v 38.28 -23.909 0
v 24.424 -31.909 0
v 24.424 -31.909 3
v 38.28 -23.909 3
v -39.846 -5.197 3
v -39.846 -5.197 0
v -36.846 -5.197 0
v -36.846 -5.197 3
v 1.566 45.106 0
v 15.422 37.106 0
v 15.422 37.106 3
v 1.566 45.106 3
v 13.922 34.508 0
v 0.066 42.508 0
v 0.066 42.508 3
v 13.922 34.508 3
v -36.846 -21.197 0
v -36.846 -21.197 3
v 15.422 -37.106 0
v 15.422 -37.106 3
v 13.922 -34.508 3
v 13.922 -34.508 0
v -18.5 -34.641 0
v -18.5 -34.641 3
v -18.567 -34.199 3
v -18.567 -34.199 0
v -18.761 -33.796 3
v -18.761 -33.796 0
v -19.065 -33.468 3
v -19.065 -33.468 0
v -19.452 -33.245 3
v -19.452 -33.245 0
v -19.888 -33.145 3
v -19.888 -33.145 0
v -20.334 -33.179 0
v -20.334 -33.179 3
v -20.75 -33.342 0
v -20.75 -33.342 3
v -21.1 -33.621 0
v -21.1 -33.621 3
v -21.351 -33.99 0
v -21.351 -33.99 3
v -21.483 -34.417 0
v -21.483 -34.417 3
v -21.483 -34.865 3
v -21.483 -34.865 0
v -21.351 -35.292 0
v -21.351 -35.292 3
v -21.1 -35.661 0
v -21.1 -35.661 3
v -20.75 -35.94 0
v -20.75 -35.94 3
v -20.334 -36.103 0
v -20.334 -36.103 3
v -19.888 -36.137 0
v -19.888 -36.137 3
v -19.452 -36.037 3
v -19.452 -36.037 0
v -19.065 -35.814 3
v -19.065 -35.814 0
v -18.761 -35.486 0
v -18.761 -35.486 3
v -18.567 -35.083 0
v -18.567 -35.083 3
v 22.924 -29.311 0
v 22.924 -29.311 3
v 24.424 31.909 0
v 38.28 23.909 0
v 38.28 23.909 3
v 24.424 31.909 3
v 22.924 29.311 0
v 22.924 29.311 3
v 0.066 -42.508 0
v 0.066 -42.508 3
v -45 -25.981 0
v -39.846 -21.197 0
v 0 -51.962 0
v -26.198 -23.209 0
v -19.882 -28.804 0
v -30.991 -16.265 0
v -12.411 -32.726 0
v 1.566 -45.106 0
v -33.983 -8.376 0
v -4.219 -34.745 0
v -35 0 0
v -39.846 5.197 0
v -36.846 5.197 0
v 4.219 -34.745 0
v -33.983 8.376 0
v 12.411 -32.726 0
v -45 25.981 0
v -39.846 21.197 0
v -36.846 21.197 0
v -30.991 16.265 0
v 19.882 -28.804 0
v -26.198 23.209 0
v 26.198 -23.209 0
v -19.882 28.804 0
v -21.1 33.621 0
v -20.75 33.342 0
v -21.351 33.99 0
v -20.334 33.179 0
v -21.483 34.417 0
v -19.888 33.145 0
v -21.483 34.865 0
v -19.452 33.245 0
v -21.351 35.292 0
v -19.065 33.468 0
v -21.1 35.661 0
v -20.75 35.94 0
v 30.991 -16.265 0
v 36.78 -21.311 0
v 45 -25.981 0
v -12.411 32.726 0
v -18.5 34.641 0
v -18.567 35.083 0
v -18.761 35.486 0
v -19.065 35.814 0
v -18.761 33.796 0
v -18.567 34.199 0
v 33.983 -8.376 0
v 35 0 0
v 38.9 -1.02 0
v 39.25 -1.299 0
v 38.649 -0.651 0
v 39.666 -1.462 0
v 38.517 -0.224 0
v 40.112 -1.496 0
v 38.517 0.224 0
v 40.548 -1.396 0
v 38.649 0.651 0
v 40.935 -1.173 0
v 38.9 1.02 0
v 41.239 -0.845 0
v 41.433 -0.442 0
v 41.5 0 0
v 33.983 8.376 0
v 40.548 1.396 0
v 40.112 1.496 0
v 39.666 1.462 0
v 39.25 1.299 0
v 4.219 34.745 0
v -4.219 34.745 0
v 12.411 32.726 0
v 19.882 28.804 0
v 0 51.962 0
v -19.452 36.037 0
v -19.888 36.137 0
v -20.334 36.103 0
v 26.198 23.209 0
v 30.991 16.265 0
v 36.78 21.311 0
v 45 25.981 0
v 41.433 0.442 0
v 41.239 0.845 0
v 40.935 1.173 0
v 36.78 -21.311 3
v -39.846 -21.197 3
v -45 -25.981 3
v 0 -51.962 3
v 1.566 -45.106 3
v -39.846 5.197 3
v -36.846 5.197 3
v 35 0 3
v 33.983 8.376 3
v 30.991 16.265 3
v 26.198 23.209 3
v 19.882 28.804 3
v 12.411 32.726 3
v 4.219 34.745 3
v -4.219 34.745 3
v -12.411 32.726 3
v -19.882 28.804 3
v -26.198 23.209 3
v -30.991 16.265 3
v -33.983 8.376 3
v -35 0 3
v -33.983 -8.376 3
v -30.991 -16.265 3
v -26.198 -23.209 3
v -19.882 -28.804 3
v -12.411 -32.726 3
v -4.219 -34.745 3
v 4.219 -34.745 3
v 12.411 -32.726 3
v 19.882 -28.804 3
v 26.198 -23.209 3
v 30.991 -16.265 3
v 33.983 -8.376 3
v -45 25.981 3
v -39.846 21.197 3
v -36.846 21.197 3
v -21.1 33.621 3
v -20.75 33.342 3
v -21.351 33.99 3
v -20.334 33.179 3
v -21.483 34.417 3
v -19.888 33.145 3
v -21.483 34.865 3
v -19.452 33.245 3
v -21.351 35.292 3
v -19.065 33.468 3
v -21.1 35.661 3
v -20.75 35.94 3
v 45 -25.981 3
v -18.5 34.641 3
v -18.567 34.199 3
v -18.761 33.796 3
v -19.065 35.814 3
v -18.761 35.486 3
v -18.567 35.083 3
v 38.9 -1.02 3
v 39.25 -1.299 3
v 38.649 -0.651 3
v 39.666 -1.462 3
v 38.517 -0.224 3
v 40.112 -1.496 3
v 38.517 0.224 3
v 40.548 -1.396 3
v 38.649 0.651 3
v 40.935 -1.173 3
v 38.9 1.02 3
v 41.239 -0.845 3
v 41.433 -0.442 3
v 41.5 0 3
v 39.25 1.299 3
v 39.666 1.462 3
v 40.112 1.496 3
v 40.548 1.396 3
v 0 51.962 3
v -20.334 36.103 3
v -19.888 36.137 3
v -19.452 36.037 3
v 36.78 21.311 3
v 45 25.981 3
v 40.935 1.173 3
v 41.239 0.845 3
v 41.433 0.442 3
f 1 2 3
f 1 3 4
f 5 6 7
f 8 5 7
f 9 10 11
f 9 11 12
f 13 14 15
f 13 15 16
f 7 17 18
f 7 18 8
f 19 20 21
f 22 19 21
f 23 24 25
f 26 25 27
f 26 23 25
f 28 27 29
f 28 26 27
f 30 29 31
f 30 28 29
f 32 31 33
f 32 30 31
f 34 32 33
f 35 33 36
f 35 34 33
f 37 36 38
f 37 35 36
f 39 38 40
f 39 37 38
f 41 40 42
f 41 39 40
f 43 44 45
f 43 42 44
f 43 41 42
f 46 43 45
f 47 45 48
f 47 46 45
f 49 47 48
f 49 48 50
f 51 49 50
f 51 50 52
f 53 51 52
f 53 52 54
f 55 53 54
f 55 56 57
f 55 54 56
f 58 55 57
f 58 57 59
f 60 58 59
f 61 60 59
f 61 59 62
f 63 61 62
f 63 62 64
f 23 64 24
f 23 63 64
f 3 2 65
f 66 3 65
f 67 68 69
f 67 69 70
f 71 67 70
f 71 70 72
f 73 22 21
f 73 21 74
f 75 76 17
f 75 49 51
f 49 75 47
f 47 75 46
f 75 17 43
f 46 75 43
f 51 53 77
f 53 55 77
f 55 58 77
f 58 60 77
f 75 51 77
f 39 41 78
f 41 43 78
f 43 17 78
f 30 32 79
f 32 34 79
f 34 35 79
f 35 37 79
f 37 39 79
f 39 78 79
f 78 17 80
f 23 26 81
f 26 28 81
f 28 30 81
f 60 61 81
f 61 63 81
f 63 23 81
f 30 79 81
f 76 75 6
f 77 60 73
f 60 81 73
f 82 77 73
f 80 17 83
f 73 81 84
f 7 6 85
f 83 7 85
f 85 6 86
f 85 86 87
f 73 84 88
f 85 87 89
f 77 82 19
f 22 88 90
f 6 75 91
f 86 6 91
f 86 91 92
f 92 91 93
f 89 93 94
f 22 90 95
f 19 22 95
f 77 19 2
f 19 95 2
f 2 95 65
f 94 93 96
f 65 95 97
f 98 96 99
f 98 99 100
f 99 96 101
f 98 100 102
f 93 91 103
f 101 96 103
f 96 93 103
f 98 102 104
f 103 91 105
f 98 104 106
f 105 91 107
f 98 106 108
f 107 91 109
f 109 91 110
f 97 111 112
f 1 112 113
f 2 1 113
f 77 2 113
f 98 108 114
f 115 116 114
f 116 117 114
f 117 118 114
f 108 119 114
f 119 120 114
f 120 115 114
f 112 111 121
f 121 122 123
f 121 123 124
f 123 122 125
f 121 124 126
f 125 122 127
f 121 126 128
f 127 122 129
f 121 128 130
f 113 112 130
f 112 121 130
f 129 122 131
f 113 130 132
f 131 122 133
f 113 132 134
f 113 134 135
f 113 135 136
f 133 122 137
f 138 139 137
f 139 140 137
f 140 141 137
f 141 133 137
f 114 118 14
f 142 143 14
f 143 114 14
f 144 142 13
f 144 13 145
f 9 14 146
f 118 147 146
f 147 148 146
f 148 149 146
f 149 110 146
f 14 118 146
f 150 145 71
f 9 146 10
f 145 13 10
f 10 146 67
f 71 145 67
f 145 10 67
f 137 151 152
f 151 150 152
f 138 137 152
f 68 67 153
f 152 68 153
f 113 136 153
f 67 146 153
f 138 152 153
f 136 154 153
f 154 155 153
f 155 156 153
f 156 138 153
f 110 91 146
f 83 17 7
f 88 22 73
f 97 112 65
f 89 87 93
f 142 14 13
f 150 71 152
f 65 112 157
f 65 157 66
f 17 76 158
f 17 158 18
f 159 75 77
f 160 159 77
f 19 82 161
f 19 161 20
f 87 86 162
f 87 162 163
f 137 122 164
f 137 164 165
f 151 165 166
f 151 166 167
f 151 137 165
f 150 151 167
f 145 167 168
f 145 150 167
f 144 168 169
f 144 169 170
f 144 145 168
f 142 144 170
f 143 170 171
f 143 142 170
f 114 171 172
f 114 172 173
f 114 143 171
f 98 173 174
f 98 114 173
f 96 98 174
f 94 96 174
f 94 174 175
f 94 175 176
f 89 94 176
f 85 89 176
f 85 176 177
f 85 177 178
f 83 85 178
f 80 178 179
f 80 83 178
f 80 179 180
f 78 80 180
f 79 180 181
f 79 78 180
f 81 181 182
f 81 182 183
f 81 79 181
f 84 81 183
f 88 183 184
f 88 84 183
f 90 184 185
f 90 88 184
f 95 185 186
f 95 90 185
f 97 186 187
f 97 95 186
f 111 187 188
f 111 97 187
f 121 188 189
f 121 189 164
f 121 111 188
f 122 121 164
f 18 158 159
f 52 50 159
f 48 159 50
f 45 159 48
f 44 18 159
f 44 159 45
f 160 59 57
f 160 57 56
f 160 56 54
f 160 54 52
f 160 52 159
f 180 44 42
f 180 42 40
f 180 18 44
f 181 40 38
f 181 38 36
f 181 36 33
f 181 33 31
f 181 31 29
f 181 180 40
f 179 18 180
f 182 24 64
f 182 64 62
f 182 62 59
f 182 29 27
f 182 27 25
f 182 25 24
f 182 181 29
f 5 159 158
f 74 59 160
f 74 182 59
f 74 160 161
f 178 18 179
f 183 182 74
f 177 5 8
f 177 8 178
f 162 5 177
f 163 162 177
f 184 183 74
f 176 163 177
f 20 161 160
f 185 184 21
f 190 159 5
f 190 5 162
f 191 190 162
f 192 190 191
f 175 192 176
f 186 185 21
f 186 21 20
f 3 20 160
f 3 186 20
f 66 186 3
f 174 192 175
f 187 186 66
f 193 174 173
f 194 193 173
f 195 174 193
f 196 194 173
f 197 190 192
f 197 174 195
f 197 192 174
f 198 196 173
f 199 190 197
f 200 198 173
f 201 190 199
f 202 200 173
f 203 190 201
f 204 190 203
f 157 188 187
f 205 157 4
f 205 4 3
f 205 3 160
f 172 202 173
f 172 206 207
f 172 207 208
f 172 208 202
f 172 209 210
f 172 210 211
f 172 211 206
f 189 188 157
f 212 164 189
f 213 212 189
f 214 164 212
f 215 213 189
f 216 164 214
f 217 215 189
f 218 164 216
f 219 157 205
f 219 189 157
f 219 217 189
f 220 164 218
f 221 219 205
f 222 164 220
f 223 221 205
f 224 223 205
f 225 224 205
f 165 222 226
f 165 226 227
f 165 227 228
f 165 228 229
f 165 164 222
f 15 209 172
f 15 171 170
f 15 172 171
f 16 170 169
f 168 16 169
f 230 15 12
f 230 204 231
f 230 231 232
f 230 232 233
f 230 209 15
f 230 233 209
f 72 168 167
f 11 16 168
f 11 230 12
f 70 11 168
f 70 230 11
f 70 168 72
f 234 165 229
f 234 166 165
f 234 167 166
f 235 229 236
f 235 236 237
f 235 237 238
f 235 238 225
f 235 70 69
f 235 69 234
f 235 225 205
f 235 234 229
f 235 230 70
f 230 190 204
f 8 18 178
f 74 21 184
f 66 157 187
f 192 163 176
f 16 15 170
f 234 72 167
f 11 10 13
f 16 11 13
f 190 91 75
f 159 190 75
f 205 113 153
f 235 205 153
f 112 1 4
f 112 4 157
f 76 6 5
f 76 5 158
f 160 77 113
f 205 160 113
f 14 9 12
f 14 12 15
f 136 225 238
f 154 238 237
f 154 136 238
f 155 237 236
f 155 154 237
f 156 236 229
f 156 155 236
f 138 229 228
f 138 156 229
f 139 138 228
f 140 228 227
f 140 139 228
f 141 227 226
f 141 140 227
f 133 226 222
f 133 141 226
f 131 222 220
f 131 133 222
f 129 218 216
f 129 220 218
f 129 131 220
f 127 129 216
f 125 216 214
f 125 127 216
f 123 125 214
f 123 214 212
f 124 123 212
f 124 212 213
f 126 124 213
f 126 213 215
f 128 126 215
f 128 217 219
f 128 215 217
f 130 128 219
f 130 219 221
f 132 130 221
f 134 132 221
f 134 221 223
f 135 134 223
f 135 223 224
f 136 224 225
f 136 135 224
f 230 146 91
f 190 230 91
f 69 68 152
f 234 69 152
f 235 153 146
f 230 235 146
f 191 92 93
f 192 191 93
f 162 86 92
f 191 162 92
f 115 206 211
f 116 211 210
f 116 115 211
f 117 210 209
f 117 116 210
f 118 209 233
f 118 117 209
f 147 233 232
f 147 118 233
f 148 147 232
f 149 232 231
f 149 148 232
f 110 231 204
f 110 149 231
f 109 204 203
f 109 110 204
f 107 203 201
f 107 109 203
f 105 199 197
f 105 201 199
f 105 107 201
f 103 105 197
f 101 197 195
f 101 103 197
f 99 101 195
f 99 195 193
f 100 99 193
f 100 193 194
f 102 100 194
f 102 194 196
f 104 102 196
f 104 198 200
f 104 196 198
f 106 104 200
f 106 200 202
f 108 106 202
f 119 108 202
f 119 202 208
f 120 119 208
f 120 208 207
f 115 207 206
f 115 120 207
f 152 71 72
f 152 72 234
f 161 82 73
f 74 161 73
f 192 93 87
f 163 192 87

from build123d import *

# Parameters (mm, degrees)
SKETCH_2_R                         = 35
EXTRUDE_1_DEPTH                    = 3
SKETCH_1_W                         = 3
SKETCH_1_H                         = 8
CUT_EXTRUDE_1_DEPTH                = 3
PATTERN_CIRCULAR_1_COUNT           = 3
PATTERN_CIRCULAR_1_COPY_1_SKETCH_W = 3
PATTERN_CIRCULAR_1_COPY_1_SKETCH_H = 8
PATTERN_CIRCULAR_1_COPY_1_DEPTH    = 3
PATTERN_CIRCULAR_1_COPY_2_SKETCH_W = 3
PATTERN_CIRCULAR_1_COPY_2_SKETCH_H = 8
PATTERN_CIRCULAR_1_COPY_2_DEPTH    = 3
SKETCH_3_R                         = 1.5
CUT_EXTRUDE_3_DEPTH                = 10


with BuildPart() as part:
    # Эскиз2 → Бобышка-Вытянуть1 (new body)
    with BuildSketch(Plane.XY):
        Polygon((0, 51.961524227), (-45, 25.980762114), (-45, -25.980762114), (0, -51.961524227), (45, -25.980762114), (45, 25.980762114), align=None)
        Circle(SKETCH_2_R, mode=Mode.SUBTRACT)
    extrude(amount=EXTRUDE_1_DEPTH)

    # Эскиз1 → Вырез-Вытянуть1 (cut)
    with BuildSketch(Plane.XY):
        with Locations((-38.34595, -17.19729)):
            Rectangle(SKETCH_1_W, SKETCH_1_H)
        with Locations((-38.34595, -9.19729)):
            Rectangle(SKETCH_1_W, SKETCH_1_H)
    cut_extrude_1 = extrude(amount=CUT_EXTRUDE_1_DEPTH, mode=Mode.SUBTRACT)

    # Зеркальное отражение1: Вырез-Вытянуть1 across plane
    add(cut_extrude_1.mirror(Plane.ZX), mode=Mode.SUBTRACT)

    # Круговой массив1: Вырез-Вытянуть1 ×3 about axis
    pattern_circular_1_axis = Axis((0, 0, 0), (0, 0, 1))
    for i in range(1, PATTERN_CIRCULAR_1_COUNT):
        add(cut_extrude_1.rotate(pattern_circular_1_axis, i * 360 / PATTERN_CIRCULAR_1_COUNT), mode=Mode.SUBTRACT)

    # Круговой массив1 copy 1 sketch → Круговой массив1 copy 1 (cut)
    with BuildSketch(Plane(origin=(0, 0, 0), x_dir=(-0.5, 0.866025404, 0), z_dir=(0, 0, 1))):
        with Locations((-38.34595, 17.19729)):
            Rectangle(PATTERN_CIRCULAR_1_COPY_1_SKETCH_W, PATTERN_CIRCULAR_1_COPY_1_SKETCH_H)
        with Locations((-38.34595, 9.19729)):
            Rectangle(PATTERN_CIRCULAR_1_COPY_1_SKETCH_W, PATTERN_CIRCULAR_1_COPY_1_SKETCH_H)
    extrude(amount=PATTERN_CIRCULAR_1_COPY_1_DEPTH, mode=Mode.SUBTRACT)

    # Круговой массив1 copy 2 sketch → Круговой массив1 copy 2 (cut)
    with BuildSketch(Plane(origin=(0, 0, 0), x_dir=(-0.5, -0.866025404, 0), z_dir=(0, 0, 1))):
        with Locations((-38.34595, 17.19729)):
            Rectangle(PATTERN_CIRCULAR_1_COPY_2_SKETCH_W, PATTERN_CIRCULAR_1_COPY_2_SKETCH_H)
        with Locations((-38.34595, 9.19729)):
            Rectangle(PATTERN_CIRCULAR_1_COPY_2_SKETCH_W, PATTERN_CIRCULAR_1_COPY_2_SKETCH_H)
    extrude(amount=PATTERN_CIRCULAR_1_COPY_2_DEPTH, mode=Mode.SUBTRACT)

    # Эскиз3 → Вырез-Вытянуть3 (cut)
    with BuildSketch(Plane.XY):
        with Locations((40, 0)):
            Circle(SKETCH_3_R)
        with Locations((-20, -34.641016151)):
            Circle(SKETCH_3_R)
        with Locations((-20, 34.641016151)):
            Circle(SKETCH_3_R)
    extrude(amount=CUT_EXTRUDE_3_DEPTH, mode=Mode.SUBTRACT)


solid = part.part
